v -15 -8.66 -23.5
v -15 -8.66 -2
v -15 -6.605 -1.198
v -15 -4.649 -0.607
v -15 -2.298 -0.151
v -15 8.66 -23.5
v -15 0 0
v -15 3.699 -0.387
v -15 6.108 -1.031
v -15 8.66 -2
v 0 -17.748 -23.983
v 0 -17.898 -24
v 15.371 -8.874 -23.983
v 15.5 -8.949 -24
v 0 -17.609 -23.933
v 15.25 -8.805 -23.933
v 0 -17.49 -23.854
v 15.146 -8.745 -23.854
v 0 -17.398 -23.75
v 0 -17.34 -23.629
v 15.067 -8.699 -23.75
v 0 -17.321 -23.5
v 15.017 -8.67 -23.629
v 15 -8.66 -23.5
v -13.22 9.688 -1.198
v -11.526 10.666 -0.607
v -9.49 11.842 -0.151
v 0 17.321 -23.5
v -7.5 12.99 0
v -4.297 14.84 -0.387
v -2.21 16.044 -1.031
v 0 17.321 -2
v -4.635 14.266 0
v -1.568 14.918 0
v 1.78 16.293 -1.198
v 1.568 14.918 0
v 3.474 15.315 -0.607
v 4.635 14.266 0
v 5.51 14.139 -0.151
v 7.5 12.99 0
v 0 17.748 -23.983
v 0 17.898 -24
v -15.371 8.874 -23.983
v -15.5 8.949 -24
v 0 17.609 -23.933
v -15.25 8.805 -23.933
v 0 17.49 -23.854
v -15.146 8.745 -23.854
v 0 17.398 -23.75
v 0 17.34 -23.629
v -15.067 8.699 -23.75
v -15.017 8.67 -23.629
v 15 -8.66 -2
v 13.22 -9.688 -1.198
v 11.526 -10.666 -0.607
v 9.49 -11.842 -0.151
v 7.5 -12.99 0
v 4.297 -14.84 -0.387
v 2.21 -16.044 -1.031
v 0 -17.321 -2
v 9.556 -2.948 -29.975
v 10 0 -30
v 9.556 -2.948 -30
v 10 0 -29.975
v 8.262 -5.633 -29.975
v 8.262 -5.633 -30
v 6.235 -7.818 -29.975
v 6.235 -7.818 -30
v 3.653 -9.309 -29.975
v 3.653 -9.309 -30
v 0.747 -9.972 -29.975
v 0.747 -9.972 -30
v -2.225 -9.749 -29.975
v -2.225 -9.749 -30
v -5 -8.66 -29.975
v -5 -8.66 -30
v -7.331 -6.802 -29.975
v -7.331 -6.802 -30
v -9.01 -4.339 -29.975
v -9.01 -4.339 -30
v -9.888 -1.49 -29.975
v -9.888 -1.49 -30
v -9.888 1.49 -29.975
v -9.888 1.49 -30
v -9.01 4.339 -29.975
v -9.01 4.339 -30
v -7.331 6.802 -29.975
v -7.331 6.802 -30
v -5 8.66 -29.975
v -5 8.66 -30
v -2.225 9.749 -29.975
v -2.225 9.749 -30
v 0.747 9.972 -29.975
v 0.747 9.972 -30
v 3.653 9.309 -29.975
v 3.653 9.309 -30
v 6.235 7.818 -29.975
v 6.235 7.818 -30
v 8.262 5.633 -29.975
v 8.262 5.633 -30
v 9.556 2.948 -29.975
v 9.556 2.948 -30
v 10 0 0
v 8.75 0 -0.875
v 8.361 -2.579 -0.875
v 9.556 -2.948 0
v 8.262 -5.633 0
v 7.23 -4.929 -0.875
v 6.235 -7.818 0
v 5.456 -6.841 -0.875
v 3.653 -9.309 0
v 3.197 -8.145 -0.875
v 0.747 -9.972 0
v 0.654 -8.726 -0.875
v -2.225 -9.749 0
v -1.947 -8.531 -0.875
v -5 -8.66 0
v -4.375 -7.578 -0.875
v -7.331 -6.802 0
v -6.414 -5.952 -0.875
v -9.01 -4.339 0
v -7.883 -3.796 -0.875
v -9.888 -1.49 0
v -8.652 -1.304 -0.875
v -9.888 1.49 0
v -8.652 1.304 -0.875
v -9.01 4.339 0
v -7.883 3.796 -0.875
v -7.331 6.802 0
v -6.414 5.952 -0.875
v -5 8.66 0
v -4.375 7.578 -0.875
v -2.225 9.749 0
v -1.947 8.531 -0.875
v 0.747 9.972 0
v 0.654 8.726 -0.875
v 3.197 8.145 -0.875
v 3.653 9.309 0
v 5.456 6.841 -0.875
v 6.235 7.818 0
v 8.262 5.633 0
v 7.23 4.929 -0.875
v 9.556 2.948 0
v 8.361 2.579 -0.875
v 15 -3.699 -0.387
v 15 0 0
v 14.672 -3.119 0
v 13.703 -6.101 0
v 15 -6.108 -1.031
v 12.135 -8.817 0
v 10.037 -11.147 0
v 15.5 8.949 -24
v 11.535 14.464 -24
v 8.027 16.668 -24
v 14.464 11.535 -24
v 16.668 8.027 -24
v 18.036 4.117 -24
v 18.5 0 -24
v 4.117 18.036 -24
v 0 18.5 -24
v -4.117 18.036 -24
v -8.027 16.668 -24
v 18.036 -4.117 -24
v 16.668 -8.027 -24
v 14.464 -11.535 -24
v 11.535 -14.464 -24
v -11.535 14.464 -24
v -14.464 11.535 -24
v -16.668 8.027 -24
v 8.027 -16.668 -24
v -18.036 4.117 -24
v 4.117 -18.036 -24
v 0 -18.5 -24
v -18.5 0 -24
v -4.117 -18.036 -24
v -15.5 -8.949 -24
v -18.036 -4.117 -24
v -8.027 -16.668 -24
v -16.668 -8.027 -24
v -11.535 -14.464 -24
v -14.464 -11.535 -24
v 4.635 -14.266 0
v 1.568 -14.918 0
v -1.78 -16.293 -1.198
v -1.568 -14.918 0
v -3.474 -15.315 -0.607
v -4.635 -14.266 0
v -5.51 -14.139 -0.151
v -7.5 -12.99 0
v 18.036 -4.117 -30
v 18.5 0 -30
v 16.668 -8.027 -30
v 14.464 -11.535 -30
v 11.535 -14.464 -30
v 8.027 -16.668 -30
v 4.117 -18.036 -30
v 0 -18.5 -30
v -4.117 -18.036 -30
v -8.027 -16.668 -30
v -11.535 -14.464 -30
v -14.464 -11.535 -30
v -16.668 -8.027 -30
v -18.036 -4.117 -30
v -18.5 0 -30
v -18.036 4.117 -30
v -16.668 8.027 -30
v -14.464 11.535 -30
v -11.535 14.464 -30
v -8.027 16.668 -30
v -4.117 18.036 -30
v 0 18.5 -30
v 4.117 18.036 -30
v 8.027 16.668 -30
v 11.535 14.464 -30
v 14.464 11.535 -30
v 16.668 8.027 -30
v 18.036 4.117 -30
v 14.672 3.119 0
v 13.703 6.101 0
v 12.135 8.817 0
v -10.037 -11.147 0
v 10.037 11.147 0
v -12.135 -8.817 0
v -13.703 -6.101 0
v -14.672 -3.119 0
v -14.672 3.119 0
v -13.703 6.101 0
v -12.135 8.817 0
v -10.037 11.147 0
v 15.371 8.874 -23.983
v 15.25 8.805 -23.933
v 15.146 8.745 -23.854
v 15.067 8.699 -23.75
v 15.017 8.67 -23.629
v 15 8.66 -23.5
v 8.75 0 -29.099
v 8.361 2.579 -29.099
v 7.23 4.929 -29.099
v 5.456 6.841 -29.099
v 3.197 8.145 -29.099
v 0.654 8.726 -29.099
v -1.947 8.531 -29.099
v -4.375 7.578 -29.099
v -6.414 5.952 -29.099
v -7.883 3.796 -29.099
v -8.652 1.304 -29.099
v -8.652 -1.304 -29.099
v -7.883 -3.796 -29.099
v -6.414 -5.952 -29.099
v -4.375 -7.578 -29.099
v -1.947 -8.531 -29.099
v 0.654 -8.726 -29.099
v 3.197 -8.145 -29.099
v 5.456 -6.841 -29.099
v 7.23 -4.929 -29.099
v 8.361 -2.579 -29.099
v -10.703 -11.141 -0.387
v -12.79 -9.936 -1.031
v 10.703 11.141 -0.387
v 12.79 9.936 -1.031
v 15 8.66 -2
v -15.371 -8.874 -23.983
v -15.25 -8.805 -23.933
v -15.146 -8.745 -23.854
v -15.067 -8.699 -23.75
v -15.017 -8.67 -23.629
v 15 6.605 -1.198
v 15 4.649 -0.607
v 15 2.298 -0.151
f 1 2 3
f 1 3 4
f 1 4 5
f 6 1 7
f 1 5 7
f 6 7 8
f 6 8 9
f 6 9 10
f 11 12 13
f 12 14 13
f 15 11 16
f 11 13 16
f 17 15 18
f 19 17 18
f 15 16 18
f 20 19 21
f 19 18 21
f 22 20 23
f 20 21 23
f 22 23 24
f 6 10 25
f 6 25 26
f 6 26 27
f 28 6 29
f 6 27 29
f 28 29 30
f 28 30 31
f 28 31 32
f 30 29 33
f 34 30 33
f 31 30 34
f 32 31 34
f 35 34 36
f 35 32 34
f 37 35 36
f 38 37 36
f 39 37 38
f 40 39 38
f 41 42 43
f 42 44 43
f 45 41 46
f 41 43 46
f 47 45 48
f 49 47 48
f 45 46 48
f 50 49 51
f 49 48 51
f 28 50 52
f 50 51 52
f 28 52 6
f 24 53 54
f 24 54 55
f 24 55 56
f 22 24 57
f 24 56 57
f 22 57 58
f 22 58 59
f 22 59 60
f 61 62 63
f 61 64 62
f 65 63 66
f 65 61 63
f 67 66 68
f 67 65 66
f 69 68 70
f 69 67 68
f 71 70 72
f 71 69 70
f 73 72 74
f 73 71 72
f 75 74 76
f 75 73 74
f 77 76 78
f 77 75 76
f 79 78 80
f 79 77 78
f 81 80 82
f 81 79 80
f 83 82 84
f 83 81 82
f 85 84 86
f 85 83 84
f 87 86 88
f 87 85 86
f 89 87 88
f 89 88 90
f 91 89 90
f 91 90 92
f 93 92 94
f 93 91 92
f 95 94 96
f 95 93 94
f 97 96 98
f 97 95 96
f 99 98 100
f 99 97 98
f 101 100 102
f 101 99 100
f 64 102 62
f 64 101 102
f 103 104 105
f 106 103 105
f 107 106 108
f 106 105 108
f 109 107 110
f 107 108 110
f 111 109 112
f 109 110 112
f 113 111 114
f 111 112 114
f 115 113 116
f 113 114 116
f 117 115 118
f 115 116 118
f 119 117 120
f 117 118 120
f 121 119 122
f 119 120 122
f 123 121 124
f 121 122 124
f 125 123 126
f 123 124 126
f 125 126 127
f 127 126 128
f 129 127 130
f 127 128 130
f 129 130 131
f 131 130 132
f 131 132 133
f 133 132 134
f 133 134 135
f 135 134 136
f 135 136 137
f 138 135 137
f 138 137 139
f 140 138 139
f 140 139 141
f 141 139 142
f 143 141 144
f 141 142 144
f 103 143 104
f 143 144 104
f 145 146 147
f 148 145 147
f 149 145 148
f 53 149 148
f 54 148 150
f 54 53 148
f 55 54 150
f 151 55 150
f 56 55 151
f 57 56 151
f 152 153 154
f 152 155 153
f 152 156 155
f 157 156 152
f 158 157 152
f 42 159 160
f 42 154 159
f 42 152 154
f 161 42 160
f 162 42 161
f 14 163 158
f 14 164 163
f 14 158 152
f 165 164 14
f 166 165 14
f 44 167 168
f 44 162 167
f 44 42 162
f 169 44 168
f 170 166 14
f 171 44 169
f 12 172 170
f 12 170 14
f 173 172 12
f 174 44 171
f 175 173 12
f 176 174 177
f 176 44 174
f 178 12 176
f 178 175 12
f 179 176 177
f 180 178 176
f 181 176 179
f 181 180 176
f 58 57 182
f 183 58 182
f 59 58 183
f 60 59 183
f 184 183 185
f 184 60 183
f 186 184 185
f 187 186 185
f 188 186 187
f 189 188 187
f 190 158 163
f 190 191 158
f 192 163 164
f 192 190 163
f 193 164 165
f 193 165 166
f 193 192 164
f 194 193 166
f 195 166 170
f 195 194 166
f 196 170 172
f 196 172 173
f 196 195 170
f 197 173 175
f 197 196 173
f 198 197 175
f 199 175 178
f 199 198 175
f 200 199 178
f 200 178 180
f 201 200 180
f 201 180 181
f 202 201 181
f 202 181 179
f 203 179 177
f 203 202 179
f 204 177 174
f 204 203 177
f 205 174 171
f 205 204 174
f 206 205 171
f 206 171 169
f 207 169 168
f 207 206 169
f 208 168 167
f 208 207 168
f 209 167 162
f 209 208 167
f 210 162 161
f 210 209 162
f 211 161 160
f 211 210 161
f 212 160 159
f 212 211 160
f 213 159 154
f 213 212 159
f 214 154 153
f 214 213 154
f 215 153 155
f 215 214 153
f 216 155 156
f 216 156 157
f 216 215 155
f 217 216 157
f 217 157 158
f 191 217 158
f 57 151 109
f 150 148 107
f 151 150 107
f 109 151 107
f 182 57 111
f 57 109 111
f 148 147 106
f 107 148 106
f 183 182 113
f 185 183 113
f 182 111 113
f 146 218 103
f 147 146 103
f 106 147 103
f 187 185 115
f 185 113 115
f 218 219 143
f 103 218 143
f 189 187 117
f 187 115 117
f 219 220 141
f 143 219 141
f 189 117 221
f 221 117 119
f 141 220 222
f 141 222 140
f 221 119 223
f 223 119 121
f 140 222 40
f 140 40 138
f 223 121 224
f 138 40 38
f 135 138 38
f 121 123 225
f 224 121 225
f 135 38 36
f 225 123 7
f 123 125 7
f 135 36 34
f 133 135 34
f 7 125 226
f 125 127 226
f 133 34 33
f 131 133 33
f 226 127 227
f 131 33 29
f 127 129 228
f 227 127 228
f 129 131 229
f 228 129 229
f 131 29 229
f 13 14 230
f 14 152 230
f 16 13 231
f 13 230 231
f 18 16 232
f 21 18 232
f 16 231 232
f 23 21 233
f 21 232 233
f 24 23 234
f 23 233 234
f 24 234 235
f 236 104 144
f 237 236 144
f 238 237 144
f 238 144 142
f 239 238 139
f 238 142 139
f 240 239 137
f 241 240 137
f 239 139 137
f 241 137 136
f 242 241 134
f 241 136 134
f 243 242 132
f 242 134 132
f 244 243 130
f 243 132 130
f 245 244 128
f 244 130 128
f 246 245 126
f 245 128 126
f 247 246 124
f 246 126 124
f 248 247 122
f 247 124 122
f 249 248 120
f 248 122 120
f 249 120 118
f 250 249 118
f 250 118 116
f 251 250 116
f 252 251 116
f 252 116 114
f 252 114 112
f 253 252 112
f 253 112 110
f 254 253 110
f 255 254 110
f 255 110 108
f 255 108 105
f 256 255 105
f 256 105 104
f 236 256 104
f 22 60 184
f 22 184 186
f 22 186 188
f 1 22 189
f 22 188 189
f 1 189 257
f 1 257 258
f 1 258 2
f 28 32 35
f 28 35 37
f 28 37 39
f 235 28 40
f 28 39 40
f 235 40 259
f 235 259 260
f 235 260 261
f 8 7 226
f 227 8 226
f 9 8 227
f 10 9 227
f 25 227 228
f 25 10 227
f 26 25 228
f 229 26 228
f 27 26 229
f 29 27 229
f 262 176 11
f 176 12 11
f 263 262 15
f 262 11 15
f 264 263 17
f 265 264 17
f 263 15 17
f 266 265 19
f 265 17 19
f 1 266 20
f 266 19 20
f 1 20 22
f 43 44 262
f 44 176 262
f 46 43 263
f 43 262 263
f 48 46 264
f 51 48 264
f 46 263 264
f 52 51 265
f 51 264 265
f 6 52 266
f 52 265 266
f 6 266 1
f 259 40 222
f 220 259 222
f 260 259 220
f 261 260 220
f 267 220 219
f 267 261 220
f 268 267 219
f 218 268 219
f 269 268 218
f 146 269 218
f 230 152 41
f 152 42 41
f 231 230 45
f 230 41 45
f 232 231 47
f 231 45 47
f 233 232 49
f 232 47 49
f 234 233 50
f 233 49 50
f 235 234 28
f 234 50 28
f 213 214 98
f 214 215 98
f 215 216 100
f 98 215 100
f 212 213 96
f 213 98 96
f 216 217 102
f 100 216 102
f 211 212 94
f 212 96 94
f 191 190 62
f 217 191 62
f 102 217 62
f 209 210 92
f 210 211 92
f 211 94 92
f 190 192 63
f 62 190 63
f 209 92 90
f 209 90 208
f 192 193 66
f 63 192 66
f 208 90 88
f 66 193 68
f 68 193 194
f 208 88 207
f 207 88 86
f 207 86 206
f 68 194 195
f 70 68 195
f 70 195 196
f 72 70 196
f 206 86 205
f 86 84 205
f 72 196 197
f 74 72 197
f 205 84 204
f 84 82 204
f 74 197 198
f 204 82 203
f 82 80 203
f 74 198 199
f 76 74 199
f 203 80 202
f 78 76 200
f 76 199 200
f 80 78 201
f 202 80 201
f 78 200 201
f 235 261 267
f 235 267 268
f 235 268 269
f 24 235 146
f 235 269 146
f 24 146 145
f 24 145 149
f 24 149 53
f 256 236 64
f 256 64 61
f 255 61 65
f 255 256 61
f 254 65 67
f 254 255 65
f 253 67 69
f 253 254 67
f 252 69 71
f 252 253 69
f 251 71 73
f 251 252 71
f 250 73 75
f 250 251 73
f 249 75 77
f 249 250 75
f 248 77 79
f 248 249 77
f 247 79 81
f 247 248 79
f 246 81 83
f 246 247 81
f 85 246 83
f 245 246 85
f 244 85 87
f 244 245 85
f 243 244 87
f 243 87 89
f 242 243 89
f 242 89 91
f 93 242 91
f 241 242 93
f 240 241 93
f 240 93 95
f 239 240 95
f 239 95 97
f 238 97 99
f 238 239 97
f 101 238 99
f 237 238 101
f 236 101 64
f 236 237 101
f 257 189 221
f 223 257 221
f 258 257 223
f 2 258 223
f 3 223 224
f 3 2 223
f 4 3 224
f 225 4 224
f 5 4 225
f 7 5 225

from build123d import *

# Parameters (mm, degrees)
BASENUTSKE_R  = 8.75
BASENUT_DEPTH = 30
COLLARSKE_W   = 6
COLLARSKE_H   = 9.75
FILLET_2_R    = 0.5


with BuildPart() as part:
    # BaseNutSke → BaseNut (new body)
    with BuildSketch(Plane.XY):
        Polygon((15, 8.660254038), (15, -8.660254038), (0, -17.320508076), (-15, -8.660254038), (-15, 8.660254038), (0, 17.320508076), align=None)
        Circle(BASENUTSKE_R, mode=Mode.SUBTRACT)
    extrude(amount=-BASENUT_DEPTH)

    # CollarSke → Collar (revolve)
    with BuildSketch(Plane(origin=(0, 0, 0), x_dir=(0, 0, -1), z_dir=(1, 0, 0)), mode=Mode.PRIVATE) as collar_sk:
        with Locations((27, 13.625)):
            Rectangle(COLLARSKE_W, COLLARSKE_H)
    revolve(collar_sk.sketch.rotate(Axis((0, 0, 0), (0, 0, -1)), 90), axis=Axis((0, 0, 0), (0, 0, -1)))

    # Sketch3 → Chamfer 2 (revolve, cut)
    with BuildSketch(Plane(origin=(0, 0, 0), x_dir=(0, 0, -1), z_dir=(1, 0, 0))):
        Polygon((2, 30.020508076), (-12.7, 30.020508076), (-12.7, 15), (0, 15), (2, 17.320508076), align=None)
    revolve(axis=Axis((0, 0, 0), (0, 0, -1)), mode=Mode.SUBTRACT)

    # Sketch5 → EndChamfer (revolve, cut)
    with BuildSketch(Plane(origin=(0, 0, 0), x_dir=(0, 0, -1), z_dir=(1, 0, 0)), mode=Mode.PRIVATE) as endchamfer_sk:
        Polygon((29.9746, 10), (29.011814635, 8.625), (30.0254, 8.625), (30.0254, 10), align=None)
        Polygon((-0.0508, 10), (0, 10), (0.962785365, 8.625), (-0.0508, 8.625), align=None)
    revolve(endchamfer_sk.sketch.rotate(Axis((0, 0, -25.037505729), (0, 0, -1)), 90), axis=Axis((0, 0, -25.037505729), (0, 0, -1)), mode=Mode.SUBTRACT)

    # Fillet 2
    fillet_2_edges = [part.edges().sort_by_distance(p)[0] for p in [
        (7.5, 12.990381057, -24),
        (-7.5, 12.990381057, -24),
        (-15, 0, -24),
        (-7.5, -12.990381057, -24),
        (7.5, -12.990381057, -24),
        (15, 0, -24),
    ]]
    fillet(fillet_2_edges, radius=FILLET_2_R)


solid = part.part
